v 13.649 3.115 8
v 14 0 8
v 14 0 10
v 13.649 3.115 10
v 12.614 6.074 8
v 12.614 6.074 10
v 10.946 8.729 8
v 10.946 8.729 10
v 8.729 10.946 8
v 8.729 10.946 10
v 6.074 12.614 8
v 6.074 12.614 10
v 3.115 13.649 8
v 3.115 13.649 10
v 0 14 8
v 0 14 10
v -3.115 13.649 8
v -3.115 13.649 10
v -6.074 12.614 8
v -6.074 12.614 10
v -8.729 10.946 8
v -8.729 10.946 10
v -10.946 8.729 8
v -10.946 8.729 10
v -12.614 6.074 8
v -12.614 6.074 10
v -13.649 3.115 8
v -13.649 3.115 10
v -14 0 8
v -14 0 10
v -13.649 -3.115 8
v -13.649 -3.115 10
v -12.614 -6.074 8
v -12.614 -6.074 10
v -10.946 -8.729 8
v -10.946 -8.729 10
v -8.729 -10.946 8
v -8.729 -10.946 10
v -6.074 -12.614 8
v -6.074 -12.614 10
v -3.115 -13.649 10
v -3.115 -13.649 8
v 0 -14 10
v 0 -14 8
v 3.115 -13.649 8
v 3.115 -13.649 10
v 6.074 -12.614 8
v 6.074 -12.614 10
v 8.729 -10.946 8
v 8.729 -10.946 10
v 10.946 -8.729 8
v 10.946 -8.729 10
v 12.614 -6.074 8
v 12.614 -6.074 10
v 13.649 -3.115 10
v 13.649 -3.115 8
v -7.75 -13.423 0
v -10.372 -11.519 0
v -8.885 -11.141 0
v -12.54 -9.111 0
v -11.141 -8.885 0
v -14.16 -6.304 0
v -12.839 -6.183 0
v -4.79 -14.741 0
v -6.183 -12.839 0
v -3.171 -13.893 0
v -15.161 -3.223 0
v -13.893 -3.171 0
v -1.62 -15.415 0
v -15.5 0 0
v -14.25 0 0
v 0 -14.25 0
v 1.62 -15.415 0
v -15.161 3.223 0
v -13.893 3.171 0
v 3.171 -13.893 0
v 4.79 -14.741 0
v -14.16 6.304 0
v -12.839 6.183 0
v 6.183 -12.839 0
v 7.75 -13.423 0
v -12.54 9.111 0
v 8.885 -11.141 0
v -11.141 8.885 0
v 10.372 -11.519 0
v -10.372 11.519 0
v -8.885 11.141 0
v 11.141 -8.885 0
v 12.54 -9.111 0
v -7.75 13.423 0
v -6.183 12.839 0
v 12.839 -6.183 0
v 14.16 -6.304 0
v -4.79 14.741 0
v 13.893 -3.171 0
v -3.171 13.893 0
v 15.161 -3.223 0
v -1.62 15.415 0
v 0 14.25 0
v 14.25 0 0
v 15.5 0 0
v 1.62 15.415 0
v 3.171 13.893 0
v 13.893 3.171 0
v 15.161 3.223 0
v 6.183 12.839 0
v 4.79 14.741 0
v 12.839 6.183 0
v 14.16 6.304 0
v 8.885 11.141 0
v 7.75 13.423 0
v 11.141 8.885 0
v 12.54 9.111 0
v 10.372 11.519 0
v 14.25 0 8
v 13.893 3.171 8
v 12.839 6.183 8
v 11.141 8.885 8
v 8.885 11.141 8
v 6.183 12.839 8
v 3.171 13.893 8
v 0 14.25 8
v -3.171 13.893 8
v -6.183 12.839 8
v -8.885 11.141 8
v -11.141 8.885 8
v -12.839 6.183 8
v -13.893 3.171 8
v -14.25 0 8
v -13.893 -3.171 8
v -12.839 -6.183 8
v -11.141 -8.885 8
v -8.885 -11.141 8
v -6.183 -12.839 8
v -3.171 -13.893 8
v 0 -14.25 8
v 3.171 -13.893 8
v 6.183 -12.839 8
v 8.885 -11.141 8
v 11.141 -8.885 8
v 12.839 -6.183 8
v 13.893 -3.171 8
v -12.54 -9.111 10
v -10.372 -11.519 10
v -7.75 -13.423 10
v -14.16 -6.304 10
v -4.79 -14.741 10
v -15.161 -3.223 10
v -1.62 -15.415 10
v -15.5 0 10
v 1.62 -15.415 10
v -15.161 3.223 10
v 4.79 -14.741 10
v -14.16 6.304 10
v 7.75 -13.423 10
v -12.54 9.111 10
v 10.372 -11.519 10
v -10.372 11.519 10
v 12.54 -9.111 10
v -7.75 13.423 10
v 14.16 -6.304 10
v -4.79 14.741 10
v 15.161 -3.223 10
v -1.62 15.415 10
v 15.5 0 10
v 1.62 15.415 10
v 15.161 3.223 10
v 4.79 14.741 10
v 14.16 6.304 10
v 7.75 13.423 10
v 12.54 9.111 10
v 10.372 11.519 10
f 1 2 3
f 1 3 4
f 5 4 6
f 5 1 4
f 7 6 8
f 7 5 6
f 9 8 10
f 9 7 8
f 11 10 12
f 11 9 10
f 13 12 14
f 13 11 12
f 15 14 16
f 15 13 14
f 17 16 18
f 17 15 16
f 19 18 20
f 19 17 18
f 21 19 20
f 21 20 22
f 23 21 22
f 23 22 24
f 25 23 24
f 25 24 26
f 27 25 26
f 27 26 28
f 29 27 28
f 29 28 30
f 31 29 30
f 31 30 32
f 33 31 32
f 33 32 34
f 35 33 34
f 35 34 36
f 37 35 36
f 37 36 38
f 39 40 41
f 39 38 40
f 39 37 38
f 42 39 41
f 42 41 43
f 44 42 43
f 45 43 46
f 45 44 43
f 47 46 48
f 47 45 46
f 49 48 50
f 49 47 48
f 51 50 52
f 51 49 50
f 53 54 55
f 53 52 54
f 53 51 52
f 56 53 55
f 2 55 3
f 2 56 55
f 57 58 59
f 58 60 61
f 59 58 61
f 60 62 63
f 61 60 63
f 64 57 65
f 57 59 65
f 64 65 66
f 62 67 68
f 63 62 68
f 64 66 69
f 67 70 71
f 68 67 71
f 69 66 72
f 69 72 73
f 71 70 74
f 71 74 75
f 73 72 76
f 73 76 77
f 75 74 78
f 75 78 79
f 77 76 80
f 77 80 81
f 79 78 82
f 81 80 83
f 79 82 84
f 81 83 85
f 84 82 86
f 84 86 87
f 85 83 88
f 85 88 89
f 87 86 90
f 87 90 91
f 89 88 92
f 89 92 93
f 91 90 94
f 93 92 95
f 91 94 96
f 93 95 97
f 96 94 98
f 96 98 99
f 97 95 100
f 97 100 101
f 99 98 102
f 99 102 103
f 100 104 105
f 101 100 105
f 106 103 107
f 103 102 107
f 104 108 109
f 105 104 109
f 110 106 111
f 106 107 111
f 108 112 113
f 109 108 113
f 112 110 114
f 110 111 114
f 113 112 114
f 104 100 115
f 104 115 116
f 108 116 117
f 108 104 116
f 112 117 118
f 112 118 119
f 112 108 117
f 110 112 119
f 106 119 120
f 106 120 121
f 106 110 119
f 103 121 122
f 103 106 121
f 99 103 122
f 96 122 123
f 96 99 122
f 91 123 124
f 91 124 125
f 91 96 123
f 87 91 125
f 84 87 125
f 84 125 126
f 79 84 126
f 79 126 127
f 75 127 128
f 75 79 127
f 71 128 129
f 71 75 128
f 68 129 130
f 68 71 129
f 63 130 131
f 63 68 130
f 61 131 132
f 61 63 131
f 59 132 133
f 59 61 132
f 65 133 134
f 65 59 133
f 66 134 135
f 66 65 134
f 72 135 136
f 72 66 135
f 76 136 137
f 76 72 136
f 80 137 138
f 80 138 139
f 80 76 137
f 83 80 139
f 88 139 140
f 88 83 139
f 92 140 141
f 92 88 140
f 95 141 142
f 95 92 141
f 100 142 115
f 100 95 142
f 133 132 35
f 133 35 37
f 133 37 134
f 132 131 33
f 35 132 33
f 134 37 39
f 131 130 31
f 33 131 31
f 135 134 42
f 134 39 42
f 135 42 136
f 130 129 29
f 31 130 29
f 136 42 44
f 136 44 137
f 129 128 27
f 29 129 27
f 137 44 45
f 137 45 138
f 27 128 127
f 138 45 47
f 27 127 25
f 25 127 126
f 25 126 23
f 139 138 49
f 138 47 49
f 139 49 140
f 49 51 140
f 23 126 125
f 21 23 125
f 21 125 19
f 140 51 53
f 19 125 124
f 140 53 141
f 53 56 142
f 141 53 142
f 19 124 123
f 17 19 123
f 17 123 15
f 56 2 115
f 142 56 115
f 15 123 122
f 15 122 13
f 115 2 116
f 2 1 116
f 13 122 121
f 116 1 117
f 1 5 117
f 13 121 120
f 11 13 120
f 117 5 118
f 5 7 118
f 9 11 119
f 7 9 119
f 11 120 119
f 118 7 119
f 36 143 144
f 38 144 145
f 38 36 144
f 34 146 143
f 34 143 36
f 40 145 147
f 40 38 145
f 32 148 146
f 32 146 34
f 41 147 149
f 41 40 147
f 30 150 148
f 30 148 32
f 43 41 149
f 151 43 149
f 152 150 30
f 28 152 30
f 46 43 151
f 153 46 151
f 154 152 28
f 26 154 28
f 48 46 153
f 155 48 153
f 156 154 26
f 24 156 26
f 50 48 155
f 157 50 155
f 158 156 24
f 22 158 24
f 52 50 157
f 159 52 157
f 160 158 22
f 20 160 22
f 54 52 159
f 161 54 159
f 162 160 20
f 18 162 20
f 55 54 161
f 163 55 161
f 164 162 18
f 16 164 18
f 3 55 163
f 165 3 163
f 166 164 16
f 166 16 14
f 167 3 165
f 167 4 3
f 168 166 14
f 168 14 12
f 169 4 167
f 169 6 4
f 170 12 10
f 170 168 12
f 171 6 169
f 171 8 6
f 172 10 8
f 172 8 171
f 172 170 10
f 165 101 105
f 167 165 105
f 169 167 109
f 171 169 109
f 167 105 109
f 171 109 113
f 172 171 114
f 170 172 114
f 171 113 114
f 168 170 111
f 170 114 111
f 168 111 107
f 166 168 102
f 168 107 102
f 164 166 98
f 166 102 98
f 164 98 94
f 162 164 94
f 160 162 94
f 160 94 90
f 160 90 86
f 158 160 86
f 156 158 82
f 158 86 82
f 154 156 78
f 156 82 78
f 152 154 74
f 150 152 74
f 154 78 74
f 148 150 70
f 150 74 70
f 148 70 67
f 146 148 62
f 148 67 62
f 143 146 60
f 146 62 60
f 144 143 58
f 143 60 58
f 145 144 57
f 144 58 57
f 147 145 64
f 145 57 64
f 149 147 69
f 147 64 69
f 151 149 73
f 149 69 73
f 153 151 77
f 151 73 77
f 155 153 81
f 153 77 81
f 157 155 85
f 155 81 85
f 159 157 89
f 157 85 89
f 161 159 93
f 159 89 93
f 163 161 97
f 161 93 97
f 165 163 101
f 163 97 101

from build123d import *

# Parameters (mm, degrees)
F0_R     = 15.5
F1_DEPTH = 10
F2_R     = 14
F3_DEPTH = 25
F4_R     = 14.25
F5_DEPTH = 8


with BuildPart() as f1:
    # F0 (on Top) → F1 (new body)
    with BuildSketch(Plane.XY):
        Circle(F0_R)
    extrude(amount=F1_DEPTH)

    # F2 (on Top) → F3 (cut)
    with BuildSketch(Plane.XY):
        Circle(F2_R)
    extrude(amount=F3_DEPTH, mode=Mode.SUBTRACT)

    # F4 (on Top) → F5 (cut)
    with BuildSketch(Plane.XY):
        Circle(F4_R)
    extrude(amount=F5_DEPTH, mode=Mode.SUBTRACT)


solid = f1.part
